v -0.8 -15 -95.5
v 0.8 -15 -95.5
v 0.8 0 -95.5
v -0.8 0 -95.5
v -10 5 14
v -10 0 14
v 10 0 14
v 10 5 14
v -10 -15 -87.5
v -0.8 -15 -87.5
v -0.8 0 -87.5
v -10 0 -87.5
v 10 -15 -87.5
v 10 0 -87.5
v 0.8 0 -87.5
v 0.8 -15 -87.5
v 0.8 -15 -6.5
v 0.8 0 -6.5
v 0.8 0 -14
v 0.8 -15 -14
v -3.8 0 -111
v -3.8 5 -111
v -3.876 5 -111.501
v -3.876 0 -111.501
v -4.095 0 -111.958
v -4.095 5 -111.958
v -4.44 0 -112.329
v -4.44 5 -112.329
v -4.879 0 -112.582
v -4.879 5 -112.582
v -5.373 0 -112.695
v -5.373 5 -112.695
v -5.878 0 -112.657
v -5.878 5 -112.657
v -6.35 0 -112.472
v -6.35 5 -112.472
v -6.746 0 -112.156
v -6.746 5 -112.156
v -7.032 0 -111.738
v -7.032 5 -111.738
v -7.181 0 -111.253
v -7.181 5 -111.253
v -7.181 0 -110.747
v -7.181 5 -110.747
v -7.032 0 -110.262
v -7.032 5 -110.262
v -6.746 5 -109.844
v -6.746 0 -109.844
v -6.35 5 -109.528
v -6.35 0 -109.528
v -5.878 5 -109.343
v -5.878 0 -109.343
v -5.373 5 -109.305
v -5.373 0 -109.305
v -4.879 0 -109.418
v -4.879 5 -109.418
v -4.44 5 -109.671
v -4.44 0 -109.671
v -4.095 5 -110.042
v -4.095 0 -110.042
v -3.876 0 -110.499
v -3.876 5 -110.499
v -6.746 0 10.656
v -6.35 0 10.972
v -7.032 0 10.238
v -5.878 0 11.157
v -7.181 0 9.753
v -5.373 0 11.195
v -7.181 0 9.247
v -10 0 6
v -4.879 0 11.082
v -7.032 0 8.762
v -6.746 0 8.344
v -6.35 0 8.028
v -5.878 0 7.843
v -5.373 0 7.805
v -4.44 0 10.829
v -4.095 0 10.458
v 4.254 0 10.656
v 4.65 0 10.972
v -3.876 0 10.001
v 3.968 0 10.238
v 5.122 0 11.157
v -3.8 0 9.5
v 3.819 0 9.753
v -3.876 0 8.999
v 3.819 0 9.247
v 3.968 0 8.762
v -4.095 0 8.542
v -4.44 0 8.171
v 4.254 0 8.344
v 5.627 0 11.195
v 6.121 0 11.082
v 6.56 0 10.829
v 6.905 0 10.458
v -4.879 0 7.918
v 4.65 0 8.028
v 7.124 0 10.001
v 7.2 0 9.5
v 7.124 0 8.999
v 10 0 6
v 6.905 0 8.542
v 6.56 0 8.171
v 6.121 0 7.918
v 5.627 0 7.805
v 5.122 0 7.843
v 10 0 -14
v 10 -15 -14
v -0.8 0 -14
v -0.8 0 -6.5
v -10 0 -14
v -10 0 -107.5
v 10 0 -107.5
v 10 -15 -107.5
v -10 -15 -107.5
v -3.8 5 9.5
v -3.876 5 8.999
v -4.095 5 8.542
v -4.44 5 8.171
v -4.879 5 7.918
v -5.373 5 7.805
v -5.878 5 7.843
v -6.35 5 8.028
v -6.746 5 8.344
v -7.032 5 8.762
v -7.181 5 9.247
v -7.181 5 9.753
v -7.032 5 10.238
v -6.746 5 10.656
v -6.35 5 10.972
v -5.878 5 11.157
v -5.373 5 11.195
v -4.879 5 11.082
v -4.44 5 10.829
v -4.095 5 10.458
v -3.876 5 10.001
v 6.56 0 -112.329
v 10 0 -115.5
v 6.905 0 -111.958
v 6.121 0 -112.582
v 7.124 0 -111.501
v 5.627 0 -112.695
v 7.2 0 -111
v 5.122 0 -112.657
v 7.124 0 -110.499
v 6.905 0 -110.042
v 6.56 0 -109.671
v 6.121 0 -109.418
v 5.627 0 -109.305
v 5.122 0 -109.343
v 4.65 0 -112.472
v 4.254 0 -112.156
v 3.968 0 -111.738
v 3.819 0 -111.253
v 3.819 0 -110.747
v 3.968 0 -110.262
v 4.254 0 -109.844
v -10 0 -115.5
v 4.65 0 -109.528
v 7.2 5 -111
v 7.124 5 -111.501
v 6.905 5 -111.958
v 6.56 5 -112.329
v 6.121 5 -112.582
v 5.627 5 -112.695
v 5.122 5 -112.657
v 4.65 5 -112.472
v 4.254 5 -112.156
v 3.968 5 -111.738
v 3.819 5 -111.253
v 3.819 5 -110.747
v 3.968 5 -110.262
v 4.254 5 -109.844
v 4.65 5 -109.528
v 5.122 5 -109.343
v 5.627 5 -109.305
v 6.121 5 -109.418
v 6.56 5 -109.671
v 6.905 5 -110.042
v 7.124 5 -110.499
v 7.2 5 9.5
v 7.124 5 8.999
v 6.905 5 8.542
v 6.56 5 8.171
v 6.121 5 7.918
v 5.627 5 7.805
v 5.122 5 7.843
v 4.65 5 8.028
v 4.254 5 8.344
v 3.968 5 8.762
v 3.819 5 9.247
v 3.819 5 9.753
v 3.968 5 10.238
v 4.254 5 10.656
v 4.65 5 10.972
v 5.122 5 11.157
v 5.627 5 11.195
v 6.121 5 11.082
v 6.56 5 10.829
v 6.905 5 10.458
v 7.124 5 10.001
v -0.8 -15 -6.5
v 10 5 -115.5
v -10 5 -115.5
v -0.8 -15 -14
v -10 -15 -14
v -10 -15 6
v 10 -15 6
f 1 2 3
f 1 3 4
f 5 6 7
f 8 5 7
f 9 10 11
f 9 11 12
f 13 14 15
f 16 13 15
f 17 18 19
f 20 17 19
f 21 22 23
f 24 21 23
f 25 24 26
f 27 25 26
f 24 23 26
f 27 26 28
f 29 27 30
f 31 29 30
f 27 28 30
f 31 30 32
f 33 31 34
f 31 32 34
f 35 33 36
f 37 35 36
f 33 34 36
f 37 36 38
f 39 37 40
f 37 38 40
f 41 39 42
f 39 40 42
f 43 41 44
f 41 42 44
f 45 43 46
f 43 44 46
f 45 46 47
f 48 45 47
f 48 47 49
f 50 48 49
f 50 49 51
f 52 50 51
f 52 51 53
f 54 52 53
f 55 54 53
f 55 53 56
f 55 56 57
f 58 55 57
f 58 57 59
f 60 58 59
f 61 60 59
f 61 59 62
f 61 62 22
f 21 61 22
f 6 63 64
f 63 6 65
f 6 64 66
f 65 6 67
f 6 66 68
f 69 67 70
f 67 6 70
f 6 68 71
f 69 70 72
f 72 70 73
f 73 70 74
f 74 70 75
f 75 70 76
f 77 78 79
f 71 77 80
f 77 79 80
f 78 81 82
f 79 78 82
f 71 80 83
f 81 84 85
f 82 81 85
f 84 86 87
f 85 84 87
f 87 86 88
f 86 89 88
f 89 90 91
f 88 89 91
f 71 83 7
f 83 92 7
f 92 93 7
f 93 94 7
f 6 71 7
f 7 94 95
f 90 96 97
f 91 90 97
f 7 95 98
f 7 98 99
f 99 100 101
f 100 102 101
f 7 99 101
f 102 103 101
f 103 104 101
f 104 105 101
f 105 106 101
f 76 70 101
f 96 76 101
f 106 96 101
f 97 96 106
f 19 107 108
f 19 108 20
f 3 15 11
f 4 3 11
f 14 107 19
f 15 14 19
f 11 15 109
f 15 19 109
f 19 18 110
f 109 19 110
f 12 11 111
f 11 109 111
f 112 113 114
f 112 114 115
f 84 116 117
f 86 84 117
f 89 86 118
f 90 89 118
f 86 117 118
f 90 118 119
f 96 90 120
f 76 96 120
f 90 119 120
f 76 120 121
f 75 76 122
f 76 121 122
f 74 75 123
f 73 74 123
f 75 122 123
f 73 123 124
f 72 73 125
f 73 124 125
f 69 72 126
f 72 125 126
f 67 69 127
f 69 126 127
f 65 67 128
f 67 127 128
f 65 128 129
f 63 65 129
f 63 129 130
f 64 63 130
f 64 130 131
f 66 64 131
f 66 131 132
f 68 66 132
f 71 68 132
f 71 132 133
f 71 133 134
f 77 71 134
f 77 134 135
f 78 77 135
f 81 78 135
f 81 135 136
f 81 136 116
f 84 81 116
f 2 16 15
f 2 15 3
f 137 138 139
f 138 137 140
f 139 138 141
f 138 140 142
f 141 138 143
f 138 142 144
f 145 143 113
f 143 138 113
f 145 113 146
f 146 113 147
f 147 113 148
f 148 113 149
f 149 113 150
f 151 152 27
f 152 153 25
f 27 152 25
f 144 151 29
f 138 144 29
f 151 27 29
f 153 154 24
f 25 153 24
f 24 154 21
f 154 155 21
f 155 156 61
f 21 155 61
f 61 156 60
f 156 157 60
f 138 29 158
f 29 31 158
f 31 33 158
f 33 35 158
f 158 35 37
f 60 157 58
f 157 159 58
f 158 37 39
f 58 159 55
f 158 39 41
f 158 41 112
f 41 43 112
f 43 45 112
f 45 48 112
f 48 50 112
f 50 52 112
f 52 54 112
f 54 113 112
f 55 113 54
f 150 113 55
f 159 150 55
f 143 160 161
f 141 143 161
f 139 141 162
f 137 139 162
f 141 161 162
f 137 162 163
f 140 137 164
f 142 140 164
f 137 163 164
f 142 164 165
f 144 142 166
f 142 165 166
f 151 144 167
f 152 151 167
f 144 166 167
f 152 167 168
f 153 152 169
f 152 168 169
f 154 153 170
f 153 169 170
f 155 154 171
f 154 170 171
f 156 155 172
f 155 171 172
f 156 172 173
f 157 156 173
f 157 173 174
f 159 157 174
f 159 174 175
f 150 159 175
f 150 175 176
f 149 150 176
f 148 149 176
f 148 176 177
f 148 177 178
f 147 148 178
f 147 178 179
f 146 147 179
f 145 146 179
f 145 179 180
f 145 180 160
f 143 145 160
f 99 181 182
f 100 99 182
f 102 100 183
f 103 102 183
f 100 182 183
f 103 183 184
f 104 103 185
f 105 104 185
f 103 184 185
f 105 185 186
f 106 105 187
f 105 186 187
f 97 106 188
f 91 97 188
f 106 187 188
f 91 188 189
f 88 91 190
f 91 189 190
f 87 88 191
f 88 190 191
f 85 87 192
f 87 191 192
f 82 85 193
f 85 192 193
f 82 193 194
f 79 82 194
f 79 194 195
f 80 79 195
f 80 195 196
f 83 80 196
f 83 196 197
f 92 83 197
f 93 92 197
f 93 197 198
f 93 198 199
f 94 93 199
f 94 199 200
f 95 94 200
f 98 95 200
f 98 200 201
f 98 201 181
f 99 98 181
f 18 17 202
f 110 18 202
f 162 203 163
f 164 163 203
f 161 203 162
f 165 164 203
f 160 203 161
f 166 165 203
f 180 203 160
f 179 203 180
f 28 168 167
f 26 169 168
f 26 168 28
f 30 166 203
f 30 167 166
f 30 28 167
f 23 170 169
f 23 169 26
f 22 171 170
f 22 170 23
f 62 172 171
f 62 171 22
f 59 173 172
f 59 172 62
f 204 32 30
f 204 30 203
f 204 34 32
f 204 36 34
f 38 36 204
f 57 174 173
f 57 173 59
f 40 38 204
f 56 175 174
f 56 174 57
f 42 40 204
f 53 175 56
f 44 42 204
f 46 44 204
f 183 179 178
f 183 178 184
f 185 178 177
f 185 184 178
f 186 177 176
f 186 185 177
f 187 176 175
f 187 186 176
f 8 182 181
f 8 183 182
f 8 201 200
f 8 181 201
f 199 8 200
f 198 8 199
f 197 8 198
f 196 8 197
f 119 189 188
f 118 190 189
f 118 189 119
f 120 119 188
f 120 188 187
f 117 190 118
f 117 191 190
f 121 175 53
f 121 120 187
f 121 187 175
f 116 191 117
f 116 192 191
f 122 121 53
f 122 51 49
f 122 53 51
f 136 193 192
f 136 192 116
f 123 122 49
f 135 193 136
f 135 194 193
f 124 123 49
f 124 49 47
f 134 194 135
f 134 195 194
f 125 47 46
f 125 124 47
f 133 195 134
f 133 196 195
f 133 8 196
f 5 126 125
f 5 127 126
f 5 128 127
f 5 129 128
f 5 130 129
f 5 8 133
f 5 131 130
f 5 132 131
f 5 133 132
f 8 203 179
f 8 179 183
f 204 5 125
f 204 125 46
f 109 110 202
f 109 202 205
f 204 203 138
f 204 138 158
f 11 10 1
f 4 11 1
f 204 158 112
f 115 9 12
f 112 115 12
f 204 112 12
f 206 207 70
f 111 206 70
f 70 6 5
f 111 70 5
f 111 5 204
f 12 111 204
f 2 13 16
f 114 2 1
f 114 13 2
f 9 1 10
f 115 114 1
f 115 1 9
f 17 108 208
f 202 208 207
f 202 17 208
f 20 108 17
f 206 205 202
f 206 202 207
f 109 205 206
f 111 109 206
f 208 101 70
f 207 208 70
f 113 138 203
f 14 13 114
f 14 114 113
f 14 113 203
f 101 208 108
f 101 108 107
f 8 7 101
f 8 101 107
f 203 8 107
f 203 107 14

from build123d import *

# Parameters (mm, degrees)
SKETCH1_W            = 20
SKETCH1_H            = 28
BOSS_EXTRUDE1_DEPTH  = 5
SKETCH2_W            = 20
SKETCH2_H            = 20
BOSS_EXTRUDE2_DEPTH  = 15
SKETCH3_W            = 1.6
SKETCH3_H            = 7.5
CUT_EXTRUDE1_DEPTH   = 15
M3_CLEARANCE_HOLE1_D = 3.4
SKETCH6_W            = 20
SKETCH6_H            = 5
BOSS_EXTRUDE3_DEPTH  = 93.5
SKETCH7_W            = 20
SKETCH7_H            = 5
BOSS_EXTRUDE4_DEPTH  = 8
SKETCH8_W            = 20
SKETCH8_H            = 20
BOSS_EXTRUDE5_DEPTH  = 15
SKETCH9_W            = 1.6
SKETCH9_H            = 35.5
CUT_EXTRUDE2_DEPTH   = 15
M3_CLEARANCE_HOLE2_D = 3.4


with BuildPart() as part:
    # Sketch1 → Boss-Extrude1 (new body)
    with BuildSketch(Plane(origin=(0, 0, 0), x_dir=(1, 0, 0), z_dir=(0, 1, 0))):
        Rectangle(SKETCH1_W, SKETCH1_H)
    extrude(amount=BOSS_EXTRUDE1_DEPTH)

    # Sketch2 → Boss-Extrude2 (add)
    with BuildSketch(Plane(origin=(0, 0, 0), x_dir=(-1, 0, 0), z_dir=(0, -1, 0))):
        with Locations((0, 4)):
            Rectangle(SKETCH2_W, SKETCH2_H)
    extrude(amount=BOSS_EXTRUDE2_DEPTH)

    # Sketch3 → Cut-Extrude1 (cut)
    with BuildSketch(Plane(origin=(0, -15, 0), x_dir=(-1, 0, 0), z_dir=(0, -1, 0))):
        with Locations((0, 10.25)):
            Rectangle(SKETCH3_W, SKETCH3_H)
    extrude(amount=-CUT_EXTRUDE1_DEPTH, mode=Mode.SUBTRACT)

    # M3 Clearance Hole1 (through all)
    with Locations(Plane(origin=(0, 0, 0), x_dir=(-1, 0, 0), z_dir=(0, -1, 0))):
        with Locations((-5.5, -9.5), (5.5, -9.5)):
            Hole(M3_CLEARANCE_HOLE1_D / 2)

    # Sketch6 → Boss-Extrude3 (add)
    with BuildSketch(Plane(origin=(0, 0, -14), x_dir=(-1, 0, 0), z_dir=(0, 0, -1))):
        with Locations((0, 2.5)):
            Rectangle(SKETCH6_W, SKETCH6_H)
    extrude(amount=BOSS_EXTRUDE3_DEPTH)

    # Sketch7 → Boss-Extrude4 (add)
    with BuildSketch(Plane(origin=(0, 0, -107.5), x_dir=(-1, 0, 0), z_dir=(0, 0, -1))):
        with Locations((0, 2.5)):
            Rectangle(SKETCH7_W, SKETCH7_H)
    extrude(amount=BOSS_EXTRUDE4_DEPTH)

    # Sketch8 → Boss-Extrude5 (add)
    with BuildSketch(Plane(origin=(0, 0, 0), x_dir=(-1, 0, 0), z_dir=(0, -1, 0))):
        with Locations((0, 97.5)):
            Rectangle(SKETCH8_W, SKETCH8_H)
    extrude(amount=BOSS_EXTRUDE5_DEPTH)

    # Sketch9 → Cut-Extrude2 (cut)
    with BuildSketch(Plane(origin=(0, -15, 0), x_dir=(-1, 0, 0), z_dir=(0, -1, 0))):
        with Locations((0, 77.75)):
            Rectangle(SKETCH9_W, SKETCH9_H)
    extrude(amount=-CUT_EXTRUDE2_DEPTH, mode=Mode.SUBTRACT)

    # M3 Clearance Hole2 (through all)
    with Locations(Plane(origin=(0, 0, 0), x_dir=(-1, 0, 0), z_dir=(0, -1, 0))):
        with Locations((-5.5, 111), (5.5, 111)):
            Hole(M3_CLEARANCE_HOLE2_D / 2)


solid = part.part
